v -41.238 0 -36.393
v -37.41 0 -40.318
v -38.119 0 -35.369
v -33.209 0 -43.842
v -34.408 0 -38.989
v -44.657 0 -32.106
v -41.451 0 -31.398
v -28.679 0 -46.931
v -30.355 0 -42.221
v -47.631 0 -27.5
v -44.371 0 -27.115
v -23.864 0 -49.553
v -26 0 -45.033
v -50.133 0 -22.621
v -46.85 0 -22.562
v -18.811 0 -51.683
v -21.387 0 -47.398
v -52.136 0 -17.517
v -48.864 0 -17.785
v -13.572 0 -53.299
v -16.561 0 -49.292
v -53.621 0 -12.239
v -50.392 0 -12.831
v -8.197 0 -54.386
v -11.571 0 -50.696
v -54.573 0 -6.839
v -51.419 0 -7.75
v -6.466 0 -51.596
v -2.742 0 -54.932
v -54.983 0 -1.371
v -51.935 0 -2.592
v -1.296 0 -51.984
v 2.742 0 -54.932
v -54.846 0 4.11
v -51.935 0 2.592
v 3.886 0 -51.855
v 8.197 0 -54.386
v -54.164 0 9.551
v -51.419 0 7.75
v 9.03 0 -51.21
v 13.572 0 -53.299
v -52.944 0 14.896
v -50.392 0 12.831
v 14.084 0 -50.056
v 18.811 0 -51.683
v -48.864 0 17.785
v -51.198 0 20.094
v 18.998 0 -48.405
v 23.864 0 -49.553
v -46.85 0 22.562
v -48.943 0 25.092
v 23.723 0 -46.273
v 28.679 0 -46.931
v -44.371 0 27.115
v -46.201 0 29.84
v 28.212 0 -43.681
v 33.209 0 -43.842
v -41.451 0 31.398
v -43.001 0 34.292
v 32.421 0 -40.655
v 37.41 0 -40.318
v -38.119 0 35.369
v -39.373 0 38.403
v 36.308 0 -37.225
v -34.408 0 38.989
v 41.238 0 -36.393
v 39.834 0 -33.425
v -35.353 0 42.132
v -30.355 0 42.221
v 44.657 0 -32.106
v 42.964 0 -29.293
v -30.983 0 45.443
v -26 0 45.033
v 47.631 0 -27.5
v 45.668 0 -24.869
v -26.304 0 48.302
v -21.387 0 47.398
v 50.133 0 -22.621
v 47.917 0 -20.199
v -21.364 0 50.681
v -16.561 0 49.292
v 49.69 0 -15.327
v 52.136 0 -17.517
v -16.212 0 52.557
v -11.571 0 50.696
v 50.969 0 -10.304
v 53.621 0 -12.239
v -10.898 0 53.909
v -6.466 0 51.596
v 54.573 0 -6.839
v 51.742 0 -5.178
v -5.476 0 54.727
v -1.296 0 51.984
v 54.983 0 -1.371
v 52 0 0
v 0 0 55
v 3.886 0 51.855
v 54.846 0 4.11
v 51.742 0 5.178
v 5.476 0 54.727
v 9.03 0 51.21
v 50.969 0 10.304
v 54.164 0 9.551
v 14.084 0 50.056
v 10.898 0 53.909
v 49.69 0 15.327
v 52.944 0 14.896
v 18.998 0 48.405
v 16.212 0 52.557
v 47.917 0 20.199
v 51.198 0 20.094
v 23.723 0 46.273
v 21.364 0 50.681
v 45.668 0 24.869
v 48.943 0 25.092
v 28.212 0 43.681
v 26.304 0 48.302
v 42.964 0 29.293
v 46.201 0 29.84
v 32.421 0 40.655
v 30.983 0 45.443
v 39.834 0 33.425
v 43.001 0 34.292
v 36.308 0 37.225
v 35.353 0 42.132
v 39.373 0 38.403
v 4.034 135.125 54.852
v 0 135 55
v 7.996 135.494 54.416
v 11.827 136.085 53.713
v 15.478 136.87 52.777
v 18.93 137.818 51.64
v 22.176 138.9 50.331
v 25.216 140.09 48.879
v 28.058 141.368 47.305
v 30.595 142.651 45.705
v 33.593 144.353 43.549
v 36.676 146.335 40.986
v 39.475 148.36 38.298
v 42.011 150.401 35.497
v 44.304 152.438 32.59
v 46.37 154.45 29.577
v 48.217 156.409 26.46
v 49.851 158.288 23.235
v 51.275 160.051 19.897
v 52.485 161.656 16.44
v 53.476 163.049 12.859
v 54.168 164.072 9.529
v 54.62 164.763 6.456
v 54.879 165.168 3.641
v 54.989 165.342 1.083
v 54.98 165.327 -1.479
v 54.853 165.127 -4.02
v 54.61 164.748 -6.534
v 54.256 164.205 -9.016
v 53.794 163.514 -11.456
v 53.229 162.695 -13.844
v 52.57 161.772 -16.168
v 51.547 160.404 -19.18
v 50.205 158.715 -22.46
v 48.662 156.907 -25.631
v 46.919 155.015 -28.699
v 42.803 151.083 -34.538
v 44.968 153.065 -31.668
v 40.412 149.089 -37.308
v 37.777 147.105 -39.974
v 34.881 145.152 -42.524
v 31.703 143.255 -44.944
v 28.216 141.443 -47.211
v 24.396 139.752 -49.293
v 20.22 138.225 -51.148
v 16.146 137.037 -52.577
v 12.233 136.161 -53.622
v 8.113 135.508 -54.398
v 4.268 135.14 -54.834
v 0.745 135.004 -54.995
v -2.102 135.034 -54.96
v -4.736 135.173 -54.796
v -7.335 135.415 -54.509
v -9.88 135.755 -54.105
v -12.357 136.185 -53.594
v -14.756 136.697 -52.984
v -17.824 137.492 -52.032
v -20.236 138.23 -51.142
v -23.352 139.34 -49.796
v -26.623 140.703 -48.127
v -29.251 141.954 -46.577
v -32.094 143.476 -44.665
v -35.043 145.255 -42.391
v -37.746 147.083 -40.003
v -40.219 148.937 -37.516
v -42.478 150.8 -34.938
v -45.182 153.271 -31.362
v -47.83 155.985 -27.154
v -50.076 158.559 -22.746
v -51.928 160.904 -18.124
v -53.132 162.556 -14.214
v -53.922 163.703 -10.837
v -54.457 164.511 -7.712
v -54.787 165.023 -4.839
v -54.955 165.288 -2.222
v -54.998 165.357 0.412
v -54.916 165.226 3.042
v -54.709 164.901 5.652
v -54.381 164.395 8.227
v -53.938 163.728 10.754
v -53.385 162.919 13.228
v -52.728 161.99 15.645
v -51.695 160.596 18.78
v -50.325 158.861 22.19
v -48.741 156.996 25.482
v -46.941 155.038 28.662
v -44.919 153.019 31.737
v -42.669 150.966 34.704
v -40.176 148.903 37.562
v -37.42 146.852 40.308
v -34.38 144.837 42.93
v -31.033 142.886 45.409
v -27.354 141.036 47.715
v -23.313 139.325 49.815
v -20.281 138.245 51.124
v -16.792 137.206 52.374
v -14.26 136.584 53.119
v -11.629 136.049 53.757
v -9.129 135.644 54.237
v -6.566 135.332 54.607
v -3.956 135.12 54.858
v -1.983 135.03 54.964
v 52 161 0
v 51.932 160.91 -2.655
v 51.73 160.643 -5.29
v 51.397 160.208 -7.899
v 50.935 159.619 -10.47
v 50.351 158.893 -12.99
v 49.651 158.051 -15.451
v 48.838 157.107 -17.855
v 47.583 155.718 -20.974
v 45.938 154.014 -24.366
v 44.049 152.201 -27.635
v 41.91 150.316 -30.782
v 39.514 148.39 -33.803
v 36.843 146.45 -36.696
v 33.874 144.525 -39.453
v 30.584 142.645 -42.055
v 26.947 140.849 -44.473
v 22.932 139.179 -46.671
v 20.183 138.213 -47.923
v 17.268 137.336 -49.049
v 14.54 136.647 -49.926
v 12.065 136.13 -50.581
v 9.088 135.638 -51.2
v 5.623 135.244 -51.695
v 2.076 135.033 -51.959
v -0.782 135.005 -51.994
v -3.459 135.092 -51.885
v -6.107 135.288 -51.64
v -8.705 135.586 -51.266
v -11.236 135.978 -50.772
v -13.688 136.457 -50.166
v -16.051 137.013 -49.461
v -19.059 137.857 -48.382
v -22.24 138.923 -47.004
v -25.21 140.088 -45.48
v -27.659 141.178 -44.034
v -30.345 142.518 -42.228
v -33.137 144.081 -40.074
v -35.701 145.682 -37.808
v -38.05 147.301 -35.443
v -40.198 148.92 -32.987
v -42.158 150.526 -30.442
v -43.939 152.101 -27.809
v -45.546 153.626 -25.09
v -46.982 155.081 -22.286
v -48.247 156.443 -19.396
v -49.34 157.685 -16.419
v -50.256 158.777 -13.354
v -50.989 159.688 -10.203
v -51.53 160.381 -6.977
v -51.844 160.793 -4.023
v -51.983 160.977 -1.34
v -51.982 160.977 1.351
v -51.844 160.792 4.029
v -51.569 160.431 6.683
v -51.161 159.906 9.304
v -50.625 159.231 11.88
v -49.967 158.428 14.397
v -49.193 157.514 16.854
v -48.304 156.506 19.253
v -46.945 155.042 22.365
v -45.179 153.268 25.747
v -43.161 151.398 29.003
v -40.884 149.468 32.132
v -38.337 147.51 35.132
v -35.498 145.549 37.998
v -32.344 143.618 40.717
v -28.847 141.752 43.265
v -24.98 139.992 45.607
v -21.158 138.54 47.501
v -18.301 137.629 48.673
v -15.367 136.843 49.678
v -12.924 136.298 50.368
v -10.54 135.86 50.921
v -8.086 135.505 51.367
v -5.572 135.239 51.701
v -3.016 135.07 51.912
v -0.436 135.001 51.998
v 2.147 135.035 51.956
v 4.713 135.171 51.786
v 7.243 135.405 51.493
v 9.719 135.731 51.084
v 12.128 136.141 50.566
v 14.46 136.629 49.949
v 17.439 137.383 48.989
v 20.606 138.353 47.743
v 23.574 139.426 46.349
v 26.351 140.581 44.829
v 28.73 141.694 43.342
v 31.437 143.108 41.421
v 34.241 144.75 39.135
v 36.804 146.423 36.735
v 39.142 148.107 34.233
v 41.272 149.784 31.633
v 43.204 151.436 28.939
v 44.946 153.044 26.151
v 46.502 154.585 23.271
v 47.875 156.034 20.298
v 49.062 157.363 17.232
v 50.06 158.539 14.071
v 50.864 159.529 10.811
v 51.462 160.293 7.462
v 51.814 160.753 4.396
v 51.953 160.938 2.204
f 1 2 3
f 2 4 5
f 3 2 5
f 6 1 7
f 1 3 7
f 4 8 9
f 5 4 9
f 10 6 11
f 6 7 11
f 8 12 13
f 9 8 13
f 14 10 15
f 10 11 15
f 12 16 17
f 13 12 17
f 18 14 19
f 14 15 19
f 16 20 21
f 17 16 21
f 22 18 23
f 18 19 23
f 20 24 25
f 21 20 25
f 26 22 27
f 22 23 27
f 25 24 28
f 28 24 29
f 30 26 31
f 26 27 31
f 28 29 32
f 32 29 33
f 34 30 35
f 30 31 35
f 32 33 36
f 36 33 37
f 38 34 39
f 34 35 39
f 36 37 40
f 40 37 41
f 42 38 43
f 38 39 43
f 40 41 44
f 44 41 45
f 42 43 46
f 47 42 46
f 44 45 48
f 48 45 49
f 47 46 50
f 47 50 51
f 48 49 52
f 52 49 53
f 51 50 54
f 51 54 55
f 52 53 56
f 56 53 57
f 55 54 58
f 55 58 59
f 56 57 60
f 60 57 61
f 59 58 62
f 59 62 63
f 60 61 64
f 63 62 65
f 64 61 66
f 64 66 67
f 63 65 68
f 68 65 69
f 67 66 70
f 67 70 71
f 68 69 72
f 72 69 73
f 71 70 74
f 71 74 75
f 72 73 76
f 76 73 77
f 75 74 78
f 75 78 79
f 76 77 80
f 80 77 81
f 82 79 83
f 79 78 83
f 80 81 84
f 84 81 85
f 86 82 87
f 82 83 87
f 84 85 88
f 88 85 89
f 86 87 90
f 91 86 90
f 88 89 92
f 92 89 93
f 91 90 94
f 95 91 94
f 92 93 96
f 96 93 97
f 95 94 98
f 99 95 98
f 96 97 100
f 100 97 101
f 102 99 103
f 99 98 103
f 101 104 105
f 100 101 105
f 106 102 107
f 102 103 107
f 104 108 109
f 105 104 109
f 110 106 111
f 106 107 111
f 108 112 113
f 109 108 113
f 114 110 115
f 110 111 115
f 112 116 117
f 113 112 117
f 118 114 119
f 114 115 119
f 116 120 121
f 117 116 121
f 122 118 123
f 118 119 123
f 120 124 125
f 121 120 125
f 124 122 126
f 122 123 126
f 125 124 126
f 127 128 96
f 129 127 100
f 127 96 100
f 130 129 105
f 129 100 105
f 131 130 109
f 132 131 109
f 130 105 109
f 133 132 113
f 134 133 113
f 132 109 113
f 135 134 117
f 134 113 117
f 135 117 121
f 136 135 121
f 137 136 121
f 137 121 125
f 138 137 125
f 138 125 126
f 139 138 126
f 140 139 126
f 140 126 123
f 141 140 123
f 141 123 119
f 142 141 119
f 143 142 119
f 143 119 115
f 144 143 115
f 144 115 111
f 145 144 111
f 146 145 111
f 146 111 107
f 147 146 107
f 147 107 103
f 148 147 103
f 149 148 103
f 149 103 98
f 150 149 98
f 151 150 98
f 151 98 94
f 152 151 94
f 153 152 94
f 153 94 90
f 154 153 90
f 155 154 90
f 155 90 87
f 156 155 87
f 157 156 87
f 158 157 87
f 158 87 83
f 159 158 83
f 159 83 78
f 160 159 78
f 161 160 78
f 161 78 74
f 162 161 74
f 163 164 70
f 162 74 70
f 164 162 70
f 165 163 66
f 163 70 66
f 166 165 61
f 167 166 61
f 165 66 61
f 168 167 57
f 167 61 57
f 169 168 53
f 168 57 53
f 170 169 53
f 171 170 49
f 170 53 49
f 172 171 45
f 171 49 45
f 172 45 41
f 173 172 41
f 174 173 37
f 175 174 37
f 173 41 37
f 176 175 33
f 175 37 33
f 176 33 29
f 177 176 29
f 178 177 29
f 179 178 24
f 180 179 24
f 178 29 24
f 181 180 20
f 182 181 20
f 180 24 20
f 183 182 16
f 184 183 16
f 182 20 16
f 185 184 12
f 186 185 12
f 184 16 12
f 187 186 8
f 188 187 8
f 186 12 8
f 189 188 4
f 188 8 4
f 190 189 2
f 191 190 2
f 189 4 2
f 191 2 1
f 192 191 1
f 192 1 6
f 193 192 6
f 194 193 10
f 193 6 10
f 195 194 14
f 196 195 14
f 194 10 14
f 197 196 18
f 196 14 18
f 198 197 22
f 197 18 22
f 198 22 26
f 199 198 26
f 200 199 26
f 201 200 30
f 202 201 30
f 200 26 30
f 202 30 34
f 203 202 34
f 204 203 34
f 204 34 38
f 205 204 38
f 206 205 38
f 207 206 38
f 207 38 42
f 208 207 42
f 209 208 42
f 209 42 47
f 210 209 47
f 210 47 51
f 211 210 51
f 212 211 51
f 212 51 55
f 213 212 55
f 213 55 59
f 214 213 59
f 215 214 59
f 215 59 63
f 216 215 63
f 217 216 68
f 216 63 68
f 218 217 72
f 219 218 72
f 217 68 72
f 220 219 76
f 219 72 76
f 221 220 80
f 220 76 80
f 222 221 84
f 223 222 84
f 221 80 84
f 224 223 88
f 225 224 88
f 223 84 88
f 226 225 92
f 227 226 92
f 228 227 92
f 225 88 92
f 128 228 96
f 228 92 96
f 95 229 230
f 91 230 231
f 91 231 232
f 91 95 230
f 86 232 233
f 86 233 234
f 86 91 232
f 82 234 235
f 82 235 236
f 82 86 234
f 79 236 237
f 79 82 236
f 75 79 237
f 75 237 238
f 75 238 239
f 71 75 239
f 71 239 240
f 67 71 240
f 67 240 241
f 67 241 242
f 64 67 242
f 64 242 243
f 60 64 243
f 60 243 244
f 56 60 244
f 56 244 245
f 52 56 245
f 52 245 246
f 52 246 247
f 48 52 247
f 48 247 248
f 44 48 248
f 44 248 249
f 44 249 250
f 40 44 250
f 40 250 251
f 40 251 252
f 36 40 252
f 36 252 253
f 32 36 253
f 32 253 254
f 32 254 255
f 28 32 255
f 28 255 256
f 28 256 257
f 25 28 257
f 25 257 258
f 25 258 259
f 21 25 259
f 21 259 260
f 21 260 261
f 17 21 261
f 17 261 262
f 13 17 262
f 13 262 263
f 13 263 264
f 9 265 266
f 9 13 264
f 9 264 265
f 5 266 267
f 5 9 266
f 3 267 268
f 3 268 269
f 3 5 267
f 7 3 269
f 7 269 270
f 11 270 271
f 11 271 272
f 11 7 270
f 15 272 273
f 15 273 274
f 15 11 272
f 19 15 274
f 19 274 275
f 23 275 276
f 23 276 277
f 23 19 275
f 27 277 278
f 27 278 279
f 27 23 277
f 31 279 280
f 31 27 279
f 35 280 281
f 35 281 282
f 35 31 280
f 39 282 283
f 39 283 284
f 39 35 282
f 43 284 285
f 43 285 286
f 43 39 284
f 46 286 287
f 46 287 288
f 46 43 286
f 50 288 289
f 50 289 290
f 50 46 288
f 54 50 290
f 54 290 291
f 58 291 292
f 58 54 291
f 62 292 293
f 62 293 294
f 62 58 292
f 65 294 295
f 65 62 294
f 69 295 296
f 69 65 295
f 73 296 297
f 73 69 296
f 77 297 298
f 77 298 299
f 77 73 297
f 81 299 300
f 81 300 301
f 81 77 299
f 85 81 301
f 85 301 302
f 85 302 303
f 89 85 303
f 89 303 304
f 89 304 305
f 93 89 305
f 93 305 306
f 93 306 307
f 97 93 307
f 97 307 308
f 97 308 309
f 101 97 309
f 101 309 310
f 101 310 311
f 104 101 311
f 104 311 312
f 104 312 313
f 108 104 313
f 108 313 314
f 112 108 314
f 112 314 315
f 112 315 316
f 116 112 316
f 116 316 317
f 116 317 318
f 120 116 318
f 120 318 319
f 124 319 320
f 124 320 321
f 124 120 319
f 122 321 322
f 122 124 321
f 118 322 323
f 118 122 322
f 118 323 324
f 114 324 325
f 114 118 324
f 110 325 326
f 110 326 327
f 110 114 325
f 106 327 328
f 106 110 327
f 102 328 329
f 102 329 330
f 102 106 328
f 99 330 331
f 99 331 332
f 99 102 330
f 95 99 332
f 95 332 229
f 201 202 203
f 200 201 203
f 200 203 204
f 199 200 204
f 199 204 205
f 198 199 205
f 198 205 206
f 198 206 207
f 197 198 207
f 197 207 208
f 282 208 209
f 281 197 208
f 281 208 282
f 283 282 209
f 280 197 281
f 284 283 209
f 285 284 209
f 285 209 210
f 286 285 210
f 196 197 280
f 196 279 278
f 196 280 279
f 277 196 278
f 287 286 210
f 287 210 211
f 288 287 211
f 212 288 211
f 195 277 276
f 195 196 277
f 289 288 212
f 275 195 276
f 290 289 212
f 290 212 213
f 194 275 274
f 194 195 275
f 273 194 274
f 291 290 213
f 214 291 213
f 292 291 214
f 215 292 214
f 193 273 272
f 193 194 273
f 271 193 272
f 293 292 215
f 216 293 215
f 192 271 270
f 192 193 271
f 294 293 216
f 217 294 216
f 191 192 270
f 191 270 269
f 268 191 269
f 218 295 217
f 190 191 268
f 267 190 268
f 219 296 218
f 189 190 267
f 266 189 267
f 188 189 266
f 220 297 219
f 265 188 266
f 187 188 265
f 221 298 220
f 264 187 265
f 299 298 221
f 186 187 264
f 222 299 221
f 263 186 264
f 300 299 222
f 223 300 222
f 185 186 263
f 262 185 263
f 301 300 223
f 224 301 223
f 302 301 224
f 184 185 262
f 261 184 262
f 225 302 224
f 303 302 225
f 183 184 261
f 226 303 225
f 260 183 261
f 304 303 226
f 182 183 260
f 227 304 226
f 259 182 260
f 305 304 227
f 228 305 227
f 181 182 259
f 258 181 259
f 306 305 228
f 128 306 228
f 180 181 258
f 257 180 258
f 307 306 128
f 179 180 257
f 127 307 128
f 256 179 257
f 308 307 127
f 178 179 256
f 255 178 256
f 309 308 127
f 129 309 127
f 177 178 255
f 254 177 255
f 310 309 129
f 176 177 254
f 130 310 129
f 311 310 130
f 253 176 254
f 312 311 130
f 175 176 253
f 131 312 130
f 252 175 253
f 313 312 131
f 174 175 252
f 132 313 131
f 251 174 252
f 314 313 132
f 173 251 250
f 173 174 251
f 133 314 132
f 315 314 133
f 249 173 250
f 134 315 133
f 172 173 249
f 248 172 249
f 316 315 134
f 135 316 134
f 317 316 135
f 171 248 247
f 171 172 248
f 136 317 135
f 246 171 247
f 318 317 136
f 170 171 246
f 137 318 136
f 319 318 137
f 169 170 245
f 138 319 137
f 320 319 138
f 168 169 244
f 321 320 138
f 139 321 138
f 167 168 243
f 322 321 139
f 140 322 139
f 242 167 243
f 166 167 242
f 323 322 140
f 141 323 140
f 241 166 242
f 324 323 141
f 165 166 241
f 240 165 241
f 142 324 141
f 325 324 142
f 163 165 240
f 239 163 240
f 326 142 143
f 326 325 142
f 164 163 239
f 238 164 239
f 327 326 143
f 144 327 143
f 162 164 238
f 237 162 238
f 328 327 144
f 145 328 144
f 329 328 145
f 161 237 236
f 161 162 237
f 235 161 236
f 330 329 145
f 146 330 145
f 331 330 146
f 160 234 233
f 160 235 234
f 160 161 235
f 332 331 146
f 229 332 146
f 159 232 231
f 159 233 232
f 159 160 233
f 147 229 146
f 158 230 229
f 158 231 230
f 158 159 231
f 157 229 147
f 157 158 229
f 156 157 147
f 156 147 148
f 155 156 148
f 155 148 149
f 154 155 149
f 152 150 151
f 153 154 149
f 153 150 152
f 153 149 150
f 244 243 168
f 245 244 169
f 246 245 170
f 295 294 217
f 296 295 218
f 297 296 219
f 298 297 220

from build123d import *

# Parameters (mm, degrees)
SKETCH_1_R               = 55
EXTRUDE_1_DEPTH          = 200
SHELL_1_OUTLINE_R        = 52
SHELL_1_DEPTH            = 200
CUT_EXTRUDE_1_DEPTH      = 215.592637339
CUT_EXTRUDE_1_DEPTH_BACK = 215.592637339
SKETCH_2_R               = 65


# Read off the part's stored shape, not the designer's step: Оболочка1
with BuildPart() as part:
    # Эскиз1 → Бобышка-Вытянуть1 (new body)
    with BuildSketch(Plane(origin=(0, 0, 0), x_dir=(1, 0, 0), z_dir=(0, 1, 0))):
        with Locations(Location((0, 0, 0), (0, 0, 270))):
            Circle(SKETCH_1_R)
    extrude(amount=EXTRUDE_1_DEPTH)

    # Оболочка1 outline → Оболочка1 (cut)
    with BuildSketch(Plane(origin=(0, 0, 0), x_dir=(1, 0, 0), z_dir=(0, 1, 0))):
        Circle(SHELL_1_OUTLINE_R)
    extrude(amount=SHELL_1_DEPTH, mode=Mode.SUBTRACT)

    # Эскиз2 → Вырез-Вытянуть1 (cut, two sides: drawn at the far end of the back side and taken through both)
    with BuildSketch(Plane.XY.offset(-CUT_EXTRUDE_1_DEPTH_BACK)):
        with Locations((0, 200)):
            Circle(SKETCH_2_R)
    extrude(amount=CUT_EXTRUDE_1_DEPTH + CUT_EXTRUDE_1_DEPTH_BACK, mode=Mode.SUBTRACT)


solid = part.part
